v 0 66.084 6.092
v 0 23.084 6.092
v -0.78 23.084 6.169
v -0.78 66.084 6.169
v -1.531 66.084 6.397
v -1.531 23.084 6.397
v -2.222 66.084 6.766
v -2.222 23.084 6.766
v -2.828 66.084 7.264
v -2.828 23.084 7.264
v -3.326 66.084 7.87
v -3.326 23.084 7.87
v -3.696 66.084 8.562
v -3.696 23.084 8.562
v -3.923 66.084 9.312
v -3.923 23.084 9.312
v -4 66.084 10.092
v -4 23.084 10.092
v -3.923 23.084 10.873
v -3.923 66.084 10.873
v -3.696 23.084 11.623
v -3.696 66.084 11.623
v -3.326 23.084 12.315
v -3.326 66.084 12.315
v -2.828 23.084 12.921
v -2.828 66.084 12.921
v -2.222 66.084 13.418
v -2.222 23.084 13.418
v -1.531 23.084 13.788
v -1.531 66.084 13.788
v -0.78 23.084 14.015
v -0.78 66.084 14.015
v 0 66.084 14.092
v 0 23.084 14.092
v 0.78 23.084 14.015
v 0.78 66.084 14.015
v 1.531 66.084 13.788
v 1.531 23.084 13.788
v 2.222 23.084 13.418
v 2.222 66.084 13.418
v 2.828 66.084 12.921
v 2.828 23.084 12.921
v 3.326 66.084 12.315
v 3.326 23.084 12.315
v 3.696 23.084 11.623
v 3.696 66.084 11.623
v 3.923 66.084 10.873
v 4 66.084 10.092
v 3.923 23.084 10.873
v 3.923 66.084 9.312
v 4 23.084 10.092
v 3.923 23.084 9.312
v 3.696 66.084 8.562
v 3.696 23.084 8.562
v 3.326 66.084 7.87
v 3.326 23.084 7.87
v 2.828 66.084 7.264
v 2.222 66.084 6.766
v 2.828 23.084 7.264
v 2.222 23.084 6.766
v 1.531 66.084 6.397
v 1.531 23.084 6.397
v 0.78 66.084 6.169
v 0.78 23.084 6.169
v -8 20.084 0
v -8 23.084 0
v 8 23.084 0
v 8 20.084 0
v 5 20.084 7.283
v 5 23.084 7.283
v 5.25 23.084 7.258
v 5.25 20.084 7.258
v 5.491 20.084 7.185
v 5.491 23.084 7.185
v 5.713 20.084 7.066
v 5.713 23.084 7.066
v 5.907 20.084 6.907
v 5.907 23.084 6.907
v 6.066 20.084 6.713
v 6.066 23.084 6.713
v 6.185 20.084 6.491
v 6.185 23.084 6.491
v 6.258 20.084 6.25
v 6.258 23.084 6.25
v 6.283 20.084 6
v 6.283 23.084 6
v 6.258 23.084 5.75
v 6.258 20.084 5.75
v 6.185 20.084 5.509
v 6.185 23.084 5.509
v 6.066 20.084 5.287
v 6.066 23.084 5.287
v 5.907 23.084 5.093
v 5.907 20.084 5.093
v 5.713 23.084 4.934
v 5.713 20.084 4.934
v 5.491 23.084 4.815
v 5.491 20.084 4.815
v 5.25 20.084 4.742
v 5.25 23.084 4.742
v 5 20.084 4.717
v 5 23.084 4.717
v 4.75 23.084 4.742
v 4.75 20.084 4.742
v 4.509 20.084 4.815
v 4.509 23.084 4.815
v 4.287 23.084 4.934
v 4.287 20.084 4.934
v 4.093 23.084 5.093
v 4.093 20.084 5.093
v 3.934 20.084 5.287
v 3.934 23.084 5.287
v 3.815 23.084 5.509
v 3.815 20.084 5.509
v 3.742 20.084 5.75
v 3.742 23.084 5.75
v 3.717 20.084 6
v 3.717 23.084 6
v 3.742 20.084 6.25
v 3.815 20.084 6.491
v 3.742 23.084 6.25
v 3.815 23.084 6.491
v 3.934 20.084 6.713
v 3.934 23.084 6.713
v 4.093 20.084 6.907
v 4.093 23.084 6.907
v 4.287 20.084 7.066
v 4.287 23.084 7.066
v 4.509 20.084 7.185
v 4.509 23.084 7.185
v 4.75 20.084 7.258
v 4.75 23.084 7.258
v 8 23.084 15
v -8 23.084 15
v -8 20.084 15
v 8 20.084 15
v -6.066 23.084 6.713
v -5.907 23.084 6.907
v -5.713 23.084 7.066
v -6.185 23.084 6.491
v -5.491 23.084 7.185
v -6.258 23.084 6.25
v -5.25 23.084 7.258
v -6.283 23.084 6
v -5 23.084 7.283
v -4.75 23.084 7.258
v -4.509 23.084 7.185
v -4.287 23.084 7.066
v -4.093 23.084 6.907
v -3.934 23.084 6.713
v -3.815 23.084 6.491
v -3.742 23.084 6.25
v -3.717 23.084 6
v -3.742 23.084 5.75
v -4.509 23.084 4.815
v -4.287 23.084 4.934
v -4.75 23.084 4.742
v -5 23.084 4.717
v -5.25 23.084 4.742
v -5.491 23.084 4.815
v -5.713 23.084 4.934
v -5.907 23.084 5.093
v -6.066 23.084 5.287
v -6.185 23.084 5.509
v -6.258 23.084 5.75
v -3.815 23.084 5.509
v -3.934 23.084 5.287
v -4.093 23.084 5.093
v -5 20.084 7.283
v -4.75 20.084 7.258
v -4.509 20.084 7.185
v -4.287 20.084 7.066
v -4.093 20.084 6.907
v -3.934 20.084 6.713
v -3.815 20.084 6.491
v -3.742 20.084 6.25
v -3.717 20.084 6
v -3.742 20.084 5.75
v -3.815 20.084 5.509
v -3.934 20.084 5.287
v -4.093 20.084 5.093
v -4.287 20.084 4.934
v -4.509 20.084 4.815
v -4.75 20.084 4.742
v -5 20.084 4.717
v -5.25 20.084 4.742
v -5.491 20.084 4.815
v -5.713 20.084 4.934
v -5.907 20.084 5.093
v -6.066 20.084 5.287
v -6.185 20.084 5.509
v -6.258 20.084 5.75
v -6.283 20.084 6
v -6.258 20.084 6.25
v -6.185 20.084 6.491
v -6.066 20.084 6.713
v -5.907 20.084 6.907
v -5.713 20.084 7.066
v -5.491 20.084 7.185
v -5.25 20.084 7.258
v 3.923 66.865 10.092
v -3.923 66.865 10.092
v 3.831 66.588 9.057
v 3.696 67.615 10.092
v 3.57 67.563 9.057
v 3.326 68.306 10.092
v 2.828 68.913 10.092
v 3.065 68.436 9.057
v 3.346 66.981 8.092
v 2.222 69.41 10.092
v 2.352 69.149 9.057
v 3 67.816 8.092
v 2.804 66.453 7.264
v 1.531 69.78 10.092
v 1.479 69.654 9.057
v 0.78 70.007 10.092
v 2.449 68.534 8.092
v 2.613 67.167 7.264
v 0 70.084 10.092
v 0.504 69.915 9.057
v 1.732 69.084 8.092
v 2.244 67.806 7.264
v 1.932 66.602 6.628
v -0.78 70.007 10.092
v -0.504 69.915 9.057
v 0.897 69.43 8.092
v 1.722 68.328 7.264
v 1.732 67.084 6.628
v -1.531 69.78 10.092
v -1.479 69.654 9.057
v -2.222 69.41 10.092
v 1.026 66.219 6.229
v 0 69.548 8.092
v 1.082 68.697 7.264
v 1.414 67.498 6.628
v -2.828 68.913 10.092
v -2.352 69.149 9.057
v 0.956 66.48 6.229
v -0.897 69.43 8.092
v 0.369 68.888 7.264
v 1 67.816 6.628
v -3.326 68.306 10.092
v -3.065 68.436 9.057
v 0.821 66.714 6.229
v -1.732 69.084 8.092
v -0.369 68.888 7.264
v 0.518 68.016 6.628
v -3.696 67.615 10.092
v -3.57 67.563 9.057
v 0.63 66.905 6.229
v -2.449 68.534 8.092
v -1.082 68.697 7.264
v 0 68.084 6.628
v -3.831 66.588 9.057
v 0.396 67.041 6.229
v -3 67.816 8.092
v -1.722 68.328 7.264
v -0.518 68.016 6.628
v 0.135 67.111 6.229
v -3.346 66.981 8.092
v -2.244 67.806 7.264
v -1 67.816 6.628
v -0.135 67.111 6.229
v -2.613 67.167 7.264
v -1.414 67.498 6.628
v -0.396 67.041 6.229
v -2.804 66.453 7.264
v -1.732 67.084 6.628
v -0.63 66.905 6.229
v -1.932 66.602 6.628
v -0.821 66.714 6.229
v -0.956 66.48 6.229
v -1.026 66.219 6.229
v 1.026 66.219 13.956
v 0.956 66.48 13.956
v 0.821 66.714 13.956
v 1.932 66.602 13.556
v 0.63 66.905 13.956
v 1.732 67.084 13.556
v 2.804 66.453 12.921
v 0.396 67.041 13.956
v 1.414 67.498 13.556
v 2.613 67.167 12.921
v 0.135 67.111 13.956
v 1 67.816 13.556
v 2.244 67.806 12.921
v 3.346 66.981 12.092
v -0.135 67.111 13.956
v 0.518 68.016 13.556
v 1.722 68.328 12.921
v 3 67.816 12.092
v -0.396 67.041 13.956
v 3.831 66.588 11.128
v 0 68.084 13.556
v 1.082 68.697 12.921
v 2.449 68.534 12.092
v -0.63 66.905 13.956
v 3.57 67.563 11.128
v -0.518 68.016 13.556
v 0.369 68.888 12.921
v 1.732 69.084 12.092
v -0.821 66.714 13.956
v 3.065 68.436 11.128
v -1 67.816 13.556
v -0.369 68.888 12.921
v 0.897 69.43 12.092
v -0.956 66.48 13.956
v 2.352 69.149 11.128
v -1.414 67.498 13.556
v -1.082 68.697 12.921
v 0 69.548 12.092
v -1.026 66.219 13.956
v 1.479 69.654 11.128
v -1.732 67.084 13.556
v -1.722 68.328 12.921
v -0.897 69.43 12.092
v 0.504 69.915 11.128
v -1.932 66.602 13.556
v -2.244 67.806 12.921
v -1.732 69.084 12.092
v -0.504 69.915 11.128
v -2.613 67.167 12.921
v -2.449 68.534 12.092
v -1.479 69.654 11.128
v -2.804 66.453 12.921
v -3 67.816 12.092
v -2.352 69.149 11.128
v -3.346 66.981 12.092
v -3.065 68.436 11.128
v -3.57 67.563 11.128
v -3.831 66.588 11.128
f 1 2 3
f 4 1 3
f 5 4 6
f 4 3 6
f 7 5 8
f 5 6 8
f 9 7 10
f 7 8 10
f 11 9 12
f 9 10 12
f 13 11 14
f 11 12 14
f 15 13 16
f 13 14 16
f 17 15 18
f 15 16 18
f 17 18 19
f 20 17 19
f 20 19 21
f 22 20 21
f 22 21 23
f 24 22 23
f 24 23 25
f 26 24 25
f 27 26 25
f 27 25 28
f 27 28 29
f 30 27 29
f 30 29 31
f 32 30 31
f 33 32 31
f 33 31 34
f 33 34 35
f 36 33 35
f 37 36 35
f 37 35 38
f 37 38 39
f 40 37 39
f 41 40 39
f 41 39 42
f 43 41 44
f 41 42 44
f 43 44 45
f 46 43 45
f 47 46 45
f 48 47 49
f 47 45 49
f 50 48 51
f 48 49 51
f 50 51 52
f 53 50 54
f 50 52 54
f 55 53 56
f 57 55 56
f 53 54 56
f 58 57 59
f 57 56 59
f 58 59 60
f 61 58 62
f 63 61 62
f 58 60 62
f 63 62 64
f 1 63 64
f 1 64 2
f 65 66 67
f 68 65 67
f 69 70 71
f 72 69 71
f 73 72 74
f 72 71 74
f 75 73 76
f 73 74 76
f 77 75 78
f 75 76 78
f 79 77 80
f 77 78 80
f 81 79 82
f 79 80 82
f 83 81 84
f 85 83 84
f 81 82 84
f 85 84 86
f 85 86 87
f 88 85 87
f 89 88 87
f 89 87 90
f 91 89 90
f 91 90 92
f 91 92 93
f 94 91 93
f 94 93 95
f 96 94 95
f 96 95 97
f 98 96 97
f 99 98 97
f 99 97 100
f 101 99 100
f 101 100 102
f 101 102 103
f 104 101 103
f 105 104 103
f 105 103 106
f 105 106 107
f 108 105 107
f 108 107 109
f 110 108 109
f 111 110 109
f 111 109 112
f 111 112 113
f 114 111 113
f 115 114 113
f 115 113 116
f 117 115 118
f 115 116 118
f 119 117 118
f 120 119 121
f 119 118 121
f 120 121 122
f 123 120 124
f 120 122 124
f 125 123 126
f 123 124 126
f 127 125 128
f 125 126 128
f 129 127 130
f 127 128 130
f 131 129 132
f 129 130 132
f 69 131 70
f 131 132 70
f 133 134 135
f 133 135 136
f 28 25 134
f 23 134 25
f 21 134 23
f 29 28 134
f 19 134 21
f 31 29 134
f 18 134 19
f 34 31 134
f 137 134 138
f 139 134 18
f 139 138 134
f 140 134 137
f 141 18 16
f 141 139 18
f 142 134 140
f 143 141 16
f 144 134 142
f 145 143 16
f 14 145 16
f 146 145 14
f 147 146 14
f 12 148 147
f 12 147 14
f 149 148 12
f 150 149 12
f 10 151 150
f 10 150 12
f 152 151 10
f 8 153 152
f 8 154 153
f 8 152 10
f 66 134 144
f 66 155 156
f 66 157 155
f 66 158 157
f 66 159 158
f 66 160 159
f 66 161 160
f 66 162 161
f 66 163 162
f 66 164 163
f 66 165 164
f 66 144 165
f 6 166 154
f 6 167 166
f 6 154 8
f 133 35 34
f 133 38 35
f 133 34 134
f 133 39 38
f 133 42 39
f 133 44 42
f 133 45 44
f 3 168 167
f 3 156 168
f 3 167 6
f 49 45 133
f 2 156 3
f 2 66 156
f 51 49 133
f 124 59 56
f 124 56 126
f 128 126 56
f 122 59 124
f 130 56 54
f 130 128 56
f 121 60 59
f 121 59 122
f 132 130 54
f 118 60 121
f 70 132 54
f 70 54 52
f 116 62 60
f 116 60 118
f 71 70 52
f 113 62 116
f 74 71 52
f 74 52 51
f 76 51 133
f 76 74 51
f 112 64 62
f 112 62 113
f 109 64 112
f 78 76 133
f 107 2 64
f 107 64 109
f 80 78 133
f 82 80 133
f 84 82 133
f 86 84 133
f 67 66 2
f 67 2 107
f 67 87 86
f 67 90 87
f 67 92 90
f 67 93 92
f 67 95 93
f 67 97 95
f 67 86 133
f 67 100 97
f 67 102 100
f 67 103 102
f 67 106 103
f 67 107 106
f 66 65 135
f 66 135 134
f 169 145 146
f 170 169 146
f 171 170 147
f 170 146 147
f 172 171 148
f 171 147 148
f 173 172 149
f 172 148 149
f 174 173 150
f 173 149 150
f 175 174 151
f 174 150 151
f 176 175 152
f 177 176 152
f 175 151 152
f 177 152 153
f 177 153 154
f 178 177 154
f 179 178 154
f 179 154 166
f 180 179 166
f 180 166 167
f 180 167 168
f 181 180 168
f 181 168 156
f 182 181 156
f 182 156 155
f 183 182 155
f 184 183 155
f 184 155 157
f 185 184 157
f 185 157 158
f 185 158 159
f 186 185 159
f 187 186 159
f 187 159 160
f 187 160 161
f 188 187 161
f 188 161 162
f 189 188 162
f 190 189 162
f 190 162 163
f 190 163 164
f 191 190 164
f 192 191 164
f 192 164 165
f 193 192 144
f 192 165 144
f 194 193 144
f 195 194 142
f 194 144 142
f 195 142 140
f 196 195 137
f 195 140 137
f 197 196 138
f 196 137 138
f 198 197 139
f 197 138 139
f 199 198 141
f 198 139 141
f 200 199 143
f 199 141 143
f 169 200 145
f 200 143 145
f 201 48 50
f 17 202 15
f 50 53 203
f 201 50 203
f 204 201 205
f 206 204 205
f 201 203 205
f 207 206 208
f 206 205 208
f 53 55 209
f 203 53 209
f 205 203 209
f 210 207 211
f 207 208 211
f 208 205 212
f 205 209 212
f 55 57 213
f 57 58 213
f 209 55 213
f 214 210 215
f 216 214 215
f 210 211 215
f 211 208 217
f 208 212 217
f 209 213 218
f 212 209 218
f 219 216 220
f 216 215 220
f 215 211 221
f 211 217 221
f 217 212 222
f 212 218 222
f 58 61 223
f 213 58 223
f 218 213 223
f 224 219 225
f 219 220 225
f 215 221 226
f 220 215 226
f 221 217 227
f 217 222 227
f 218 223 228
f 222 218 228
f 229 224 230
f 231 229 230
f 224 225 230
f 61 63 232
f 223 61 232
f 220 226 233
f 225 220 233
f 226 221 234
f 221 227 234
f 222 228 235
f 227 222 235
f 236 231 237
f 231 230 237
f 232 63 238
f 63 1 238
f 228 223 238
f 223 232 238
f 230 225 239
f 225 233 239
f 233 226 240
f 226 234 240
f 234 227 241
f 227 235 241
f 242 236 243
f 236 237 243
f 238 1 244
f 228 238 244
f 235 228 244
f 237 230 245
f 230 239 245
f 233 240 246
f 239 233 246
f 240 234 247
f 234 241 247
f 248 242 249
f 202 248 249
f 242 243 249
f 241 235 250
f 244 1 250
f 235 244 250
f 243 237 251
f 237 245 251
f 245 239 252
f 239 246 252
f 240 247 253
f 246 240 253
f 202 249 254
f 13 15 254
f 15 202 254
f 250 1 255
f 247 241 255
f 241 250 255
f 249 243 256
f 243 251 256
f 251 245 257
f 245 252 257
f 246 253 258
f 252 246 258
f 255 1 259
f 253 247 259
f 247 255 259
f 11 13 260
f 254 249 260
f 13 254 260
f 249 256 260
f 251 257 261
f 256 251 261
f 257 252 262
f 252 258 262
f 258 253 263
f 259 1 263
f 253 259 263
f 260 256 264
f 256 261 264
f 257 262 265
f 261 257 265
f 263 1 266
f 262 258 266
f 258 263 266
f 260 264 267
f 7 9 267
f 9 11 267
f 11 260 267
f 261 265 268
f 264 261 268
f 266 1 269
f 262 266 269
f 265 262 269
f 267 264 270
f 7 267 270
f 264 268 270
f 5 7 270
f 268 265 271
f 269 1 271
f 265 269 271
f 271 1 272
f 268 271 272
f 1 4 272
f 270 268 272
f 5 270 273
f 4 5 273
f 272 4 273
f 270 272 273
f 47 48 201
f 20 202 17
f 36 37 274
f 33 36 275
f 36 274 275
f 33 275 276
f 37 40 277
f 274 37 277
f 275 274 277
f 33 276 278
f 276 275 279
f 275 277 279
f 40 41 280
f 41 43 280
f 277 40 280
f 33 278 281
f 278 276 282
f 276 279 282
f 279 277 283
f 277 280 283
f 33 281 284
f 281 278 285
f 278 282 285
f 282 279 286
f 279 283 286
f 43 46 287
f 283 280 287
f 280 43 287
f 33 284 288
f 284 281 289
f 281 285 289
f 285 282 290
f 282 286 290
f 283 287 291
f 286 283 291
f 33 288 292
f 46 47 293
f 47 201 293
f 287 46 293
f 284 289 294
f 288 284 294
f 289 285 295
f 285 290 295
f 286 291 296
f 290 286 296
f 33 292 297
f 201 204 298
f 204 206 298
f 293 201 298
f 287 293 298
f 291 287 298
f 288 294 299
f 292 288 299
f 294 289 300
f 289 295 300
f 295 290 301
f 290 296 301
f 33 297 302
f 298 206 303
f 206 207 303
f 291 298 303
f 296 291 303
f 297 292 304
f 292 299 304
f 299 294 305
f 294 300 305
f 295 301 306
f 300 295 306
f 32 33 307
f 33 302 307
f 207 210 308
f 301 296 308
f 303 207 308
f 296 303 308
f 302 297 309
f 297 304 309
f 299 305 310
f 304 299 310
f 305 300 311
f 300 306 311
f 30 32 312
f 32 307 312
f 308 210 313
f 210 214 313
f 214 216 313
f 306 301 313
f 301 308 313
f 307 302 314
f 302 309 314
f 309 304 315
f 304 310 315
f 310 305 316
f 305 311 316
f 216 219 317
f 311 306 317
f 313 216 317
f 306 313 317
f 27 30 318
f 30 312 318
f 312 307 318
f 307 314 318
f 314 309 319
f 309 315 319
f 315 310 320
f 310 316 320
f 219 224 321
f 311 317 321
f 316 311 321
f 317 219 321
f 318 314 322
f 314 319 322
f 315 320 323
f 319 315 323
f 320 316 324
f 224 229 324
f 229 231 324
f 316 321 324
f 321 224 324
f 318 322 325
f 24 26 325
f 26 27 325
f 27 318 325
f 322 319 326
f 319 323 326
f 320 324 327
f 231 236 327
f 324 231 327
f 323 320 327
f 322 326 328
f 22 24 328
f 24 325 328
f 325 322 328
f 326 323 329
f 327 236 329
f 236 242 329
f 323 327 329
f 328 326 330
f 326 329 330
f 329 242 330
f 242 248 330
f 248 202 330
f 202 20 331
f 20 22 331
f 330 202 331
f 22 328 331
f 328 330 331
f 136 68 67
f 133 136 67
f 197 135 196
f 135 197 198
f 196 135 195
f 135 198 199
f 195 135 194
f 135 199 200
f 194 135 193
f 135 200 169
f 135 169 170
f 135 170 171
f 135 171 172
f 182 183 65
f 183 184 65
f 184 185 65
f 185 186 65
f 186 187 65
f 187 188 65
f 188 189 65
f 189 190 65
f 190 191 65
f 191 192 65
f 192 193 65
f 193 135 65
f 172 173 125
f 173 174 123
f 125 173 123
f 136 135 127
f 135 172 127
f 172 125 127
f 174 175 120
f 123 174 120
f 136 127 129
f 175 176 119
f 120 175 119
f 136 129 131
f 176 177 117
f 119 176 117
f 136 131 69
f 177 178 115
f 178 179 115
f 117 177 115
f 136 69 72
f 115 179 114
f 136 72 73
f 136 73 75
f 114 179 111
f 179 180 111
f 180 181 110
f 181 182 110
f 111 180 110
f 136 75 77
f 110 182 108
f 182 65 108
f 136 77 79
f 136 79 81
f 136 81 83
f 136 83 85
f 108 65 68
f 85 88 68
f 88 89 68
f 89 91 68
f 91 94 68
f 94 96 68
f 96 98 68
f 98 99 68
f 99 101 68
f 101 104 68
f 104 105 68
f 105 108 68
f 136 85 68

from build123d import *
from build123d.topology import SkipClean

# Parameters (mm, degrees)
SKETCH1_W           = 16
SKETCH1_H           = 3
BOSS_EXTRUDE1_DEPTH = 15
SKETCH2_R           = 1.282586005
CUT_EXTRUDE1_DEPTH  = 12
SKETCH3_R           = 4
BOSS_EXTRUDE2_DEPTH = 43


with BuildPart() as part:
    # Sketch1 → Boss-Extrude1 (new body)
    with BuildSketch(Plane.XY):
        with Locations((0, 21.58414062)):
            Rectangle(SKETCH1_W, SKETCH1_H)
    extrude(amount=BOSS_EXTRUDE1_DEPTH)

    # Sketch2 → Cut-Extrude1 (cut)
    with BuildSketch(Plane(origin=(0, 23.08414062, 0), x_dir=(1, 0, 0), z_dir=(0, 1, 0))):
        with Locations(Location((5, -6, 0), (0, 0, 270))):
            Circle(SKETCH2_R)
        with Locations(Location((-5, -6, 0), (0, 0, 270))):
            Circle(SKETCH2_R)
    extrude(amount=-CUT_EXTRUDE1_DEPTH, mode=Mode.SUBTRACT)

    # Sketch3 → Boss-Extrude2 (add)
    with BuildSketch(Plane(origin=(0, 23.08414062, 0), x_dir=(1, 0, 0), z_dir=(0, 1, 0))):
        with Locations(Location((0, -10.092270702, 0), (0, 0, 90))):
            Circle(SKETCH3_R)
    extrude(amount=BOSS_EXTRUDE2_DEPTH)

    # Sketch5 → Revolve1 (revolve)
    with SkipClean():  # the faces are left unmerged after this step: merging them gives an invalid solid
        with BuildSketch(Plane(origin=(0, 66.08414062, 0), x_dir=(1, 0, 0), z_dir=(0, 1, 0))):
            with BuildLine():
                ThreePointArc((4, -10.092270702), (2.828427125, -7.263843577), (0, -6.092270702))
                Line((0, -6.092270702), (0, -14.092270702))
                ThreePointArc((0, -14.092270702), (2.828427125, -12.920697827), (4, -10.092270702))
            make_face()
            with BuildLine():
                Line((0, -14.092270702), (0, -6.092270702))
                ThreePointArc((0, -6.092270702), (-4, -10.092270702), (0, -14.092270702))
            make_face()
        revolve(axis=Axis((0, 66.08414062, 6.092270702), (0, 0, 1)))


solid = part.part
